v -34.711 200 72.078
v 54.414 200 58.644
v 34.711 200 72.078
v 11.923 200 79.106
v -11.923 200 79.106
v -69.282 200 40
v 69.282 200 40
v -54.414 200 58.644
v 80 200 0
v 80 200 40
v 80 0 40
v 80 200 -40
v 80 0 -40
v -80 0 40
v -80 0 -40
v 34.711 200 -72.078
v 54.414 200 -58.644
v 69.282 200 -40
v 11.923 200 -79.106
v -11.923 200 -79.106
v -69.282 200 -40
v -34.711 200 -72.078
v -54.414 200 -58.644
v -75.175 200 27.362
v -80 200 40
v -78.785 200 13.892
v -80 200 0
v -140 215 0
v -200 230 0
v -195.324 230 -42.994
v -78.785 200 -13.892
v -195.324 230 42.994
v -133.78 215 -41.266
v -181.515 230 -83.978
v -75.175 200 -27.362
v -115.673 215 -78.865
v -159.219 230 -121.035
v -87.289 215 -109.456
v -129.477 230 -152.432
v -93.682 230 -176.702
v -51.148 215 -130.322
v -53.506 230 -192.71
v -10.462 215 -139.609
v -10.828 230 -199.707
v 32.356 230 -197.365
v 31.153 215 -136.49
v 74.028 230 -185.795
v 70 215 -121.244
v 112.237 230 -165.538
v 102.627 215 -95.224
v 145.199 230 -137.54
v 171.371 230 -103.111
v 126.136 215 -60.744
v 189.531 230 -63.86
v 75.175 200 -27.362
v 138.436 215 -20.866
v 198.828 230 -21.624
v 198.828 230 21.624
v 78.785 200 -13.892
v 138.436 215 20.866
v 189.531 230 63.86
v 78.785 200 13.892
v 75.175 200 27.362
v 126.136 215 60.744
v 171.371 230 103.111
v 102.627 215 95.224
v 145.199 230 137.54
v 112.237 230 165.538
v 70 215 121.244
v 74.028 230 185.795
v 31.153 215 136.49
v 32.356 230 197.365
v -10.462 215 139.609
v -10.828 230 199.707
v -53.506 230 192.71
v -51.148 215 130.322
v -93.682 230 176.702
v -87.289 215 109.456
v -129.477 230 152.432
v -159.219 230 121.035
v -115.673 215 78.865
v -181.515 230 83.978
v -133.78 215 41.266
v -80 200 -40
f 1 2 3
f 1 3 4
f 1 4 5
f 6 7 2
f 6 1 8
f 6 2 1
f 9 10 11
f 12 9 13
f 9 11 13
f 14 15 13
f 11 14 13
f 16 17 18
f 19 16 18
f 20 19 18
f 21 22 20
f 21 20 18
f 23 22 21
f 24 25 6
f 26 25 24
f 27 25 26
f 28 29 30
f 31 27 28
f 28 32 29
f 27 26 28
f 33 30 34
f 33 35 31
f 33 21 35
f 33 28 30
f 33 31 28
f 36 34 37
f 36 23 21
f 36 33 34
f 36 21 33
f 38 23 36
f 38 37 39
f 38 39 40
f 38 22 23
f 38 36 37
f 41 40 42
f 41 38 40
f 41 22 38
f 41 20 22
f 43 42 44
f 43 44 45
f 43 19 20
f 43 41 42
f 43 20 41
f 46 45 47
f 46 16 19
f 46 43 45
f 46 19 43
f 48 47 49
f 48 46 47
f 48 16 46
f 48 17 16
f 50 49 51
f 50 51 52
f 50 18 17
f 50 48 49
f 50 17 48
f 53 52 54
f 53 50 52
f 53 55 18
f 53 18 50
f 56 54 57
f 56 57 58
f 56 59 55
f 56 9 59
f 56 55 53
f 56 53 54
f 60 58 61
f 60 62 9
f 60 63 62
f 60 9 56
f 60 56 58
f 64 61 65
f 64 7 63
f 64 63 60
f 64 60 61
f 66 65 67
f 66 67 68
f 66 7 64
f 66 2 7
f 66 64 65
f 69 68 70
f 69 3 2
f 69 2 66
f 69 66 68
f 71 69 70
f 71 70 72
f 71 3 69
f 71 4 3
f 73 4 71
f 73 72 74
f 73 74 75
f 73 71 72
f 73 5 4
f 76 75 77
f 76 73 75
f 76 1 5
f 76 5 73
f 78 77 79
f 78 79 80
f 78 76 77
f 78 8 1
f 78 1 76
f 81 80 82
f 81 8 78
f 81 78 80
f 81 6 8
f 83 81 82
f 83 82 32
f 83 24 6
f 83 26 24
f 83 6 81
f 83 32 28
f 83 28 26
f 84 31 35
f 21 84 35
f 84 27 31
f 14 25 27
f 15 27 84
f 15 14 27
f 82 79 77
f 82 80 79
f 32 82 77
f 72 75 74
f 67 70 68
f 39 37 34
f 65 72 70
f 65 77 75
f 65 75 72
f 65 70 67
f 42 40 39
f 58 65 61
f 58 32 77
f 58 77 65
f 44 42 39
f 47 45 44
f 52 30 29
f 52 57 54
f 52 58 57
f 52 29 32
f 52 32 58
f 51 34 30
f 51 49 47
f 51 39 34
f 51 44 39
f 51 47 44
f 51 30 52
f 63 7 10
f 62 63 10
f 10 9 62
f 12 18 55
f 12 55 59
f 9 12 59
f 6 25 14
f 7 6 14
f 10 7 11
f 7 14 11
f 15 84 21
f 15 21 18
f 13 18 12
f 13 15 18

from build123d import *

# Parameters (mm, degrees)
SKETCH_1_W      = 160
SKETCH_1_H      = 80
EXTRUDE_1_DEPTH = 200


with BuildPart() as part:
    # 草图1 → 凸台-拉伸1 (new body)
    with BuildSketch(Plane(origin=(0, 0, 0), x_dir=(1, 0, 0), z_dir=(0, 1, 0))):
        Rectangle(SKETCH_1_W, SKETCH_1_H)
    extrude(amount=EXTRUDE_1_DEPTH)

    # 草图2 → 旋转1 (revolve)
    with BuildSketch(Plane.XY):
        Polygon((0, 230), (-200, 230), (-80, 200), (0, 200), align=None)
    revolve(axis=Axis((0, 242.596859874, 0), (0, -1, 0)))


solid = part.part
